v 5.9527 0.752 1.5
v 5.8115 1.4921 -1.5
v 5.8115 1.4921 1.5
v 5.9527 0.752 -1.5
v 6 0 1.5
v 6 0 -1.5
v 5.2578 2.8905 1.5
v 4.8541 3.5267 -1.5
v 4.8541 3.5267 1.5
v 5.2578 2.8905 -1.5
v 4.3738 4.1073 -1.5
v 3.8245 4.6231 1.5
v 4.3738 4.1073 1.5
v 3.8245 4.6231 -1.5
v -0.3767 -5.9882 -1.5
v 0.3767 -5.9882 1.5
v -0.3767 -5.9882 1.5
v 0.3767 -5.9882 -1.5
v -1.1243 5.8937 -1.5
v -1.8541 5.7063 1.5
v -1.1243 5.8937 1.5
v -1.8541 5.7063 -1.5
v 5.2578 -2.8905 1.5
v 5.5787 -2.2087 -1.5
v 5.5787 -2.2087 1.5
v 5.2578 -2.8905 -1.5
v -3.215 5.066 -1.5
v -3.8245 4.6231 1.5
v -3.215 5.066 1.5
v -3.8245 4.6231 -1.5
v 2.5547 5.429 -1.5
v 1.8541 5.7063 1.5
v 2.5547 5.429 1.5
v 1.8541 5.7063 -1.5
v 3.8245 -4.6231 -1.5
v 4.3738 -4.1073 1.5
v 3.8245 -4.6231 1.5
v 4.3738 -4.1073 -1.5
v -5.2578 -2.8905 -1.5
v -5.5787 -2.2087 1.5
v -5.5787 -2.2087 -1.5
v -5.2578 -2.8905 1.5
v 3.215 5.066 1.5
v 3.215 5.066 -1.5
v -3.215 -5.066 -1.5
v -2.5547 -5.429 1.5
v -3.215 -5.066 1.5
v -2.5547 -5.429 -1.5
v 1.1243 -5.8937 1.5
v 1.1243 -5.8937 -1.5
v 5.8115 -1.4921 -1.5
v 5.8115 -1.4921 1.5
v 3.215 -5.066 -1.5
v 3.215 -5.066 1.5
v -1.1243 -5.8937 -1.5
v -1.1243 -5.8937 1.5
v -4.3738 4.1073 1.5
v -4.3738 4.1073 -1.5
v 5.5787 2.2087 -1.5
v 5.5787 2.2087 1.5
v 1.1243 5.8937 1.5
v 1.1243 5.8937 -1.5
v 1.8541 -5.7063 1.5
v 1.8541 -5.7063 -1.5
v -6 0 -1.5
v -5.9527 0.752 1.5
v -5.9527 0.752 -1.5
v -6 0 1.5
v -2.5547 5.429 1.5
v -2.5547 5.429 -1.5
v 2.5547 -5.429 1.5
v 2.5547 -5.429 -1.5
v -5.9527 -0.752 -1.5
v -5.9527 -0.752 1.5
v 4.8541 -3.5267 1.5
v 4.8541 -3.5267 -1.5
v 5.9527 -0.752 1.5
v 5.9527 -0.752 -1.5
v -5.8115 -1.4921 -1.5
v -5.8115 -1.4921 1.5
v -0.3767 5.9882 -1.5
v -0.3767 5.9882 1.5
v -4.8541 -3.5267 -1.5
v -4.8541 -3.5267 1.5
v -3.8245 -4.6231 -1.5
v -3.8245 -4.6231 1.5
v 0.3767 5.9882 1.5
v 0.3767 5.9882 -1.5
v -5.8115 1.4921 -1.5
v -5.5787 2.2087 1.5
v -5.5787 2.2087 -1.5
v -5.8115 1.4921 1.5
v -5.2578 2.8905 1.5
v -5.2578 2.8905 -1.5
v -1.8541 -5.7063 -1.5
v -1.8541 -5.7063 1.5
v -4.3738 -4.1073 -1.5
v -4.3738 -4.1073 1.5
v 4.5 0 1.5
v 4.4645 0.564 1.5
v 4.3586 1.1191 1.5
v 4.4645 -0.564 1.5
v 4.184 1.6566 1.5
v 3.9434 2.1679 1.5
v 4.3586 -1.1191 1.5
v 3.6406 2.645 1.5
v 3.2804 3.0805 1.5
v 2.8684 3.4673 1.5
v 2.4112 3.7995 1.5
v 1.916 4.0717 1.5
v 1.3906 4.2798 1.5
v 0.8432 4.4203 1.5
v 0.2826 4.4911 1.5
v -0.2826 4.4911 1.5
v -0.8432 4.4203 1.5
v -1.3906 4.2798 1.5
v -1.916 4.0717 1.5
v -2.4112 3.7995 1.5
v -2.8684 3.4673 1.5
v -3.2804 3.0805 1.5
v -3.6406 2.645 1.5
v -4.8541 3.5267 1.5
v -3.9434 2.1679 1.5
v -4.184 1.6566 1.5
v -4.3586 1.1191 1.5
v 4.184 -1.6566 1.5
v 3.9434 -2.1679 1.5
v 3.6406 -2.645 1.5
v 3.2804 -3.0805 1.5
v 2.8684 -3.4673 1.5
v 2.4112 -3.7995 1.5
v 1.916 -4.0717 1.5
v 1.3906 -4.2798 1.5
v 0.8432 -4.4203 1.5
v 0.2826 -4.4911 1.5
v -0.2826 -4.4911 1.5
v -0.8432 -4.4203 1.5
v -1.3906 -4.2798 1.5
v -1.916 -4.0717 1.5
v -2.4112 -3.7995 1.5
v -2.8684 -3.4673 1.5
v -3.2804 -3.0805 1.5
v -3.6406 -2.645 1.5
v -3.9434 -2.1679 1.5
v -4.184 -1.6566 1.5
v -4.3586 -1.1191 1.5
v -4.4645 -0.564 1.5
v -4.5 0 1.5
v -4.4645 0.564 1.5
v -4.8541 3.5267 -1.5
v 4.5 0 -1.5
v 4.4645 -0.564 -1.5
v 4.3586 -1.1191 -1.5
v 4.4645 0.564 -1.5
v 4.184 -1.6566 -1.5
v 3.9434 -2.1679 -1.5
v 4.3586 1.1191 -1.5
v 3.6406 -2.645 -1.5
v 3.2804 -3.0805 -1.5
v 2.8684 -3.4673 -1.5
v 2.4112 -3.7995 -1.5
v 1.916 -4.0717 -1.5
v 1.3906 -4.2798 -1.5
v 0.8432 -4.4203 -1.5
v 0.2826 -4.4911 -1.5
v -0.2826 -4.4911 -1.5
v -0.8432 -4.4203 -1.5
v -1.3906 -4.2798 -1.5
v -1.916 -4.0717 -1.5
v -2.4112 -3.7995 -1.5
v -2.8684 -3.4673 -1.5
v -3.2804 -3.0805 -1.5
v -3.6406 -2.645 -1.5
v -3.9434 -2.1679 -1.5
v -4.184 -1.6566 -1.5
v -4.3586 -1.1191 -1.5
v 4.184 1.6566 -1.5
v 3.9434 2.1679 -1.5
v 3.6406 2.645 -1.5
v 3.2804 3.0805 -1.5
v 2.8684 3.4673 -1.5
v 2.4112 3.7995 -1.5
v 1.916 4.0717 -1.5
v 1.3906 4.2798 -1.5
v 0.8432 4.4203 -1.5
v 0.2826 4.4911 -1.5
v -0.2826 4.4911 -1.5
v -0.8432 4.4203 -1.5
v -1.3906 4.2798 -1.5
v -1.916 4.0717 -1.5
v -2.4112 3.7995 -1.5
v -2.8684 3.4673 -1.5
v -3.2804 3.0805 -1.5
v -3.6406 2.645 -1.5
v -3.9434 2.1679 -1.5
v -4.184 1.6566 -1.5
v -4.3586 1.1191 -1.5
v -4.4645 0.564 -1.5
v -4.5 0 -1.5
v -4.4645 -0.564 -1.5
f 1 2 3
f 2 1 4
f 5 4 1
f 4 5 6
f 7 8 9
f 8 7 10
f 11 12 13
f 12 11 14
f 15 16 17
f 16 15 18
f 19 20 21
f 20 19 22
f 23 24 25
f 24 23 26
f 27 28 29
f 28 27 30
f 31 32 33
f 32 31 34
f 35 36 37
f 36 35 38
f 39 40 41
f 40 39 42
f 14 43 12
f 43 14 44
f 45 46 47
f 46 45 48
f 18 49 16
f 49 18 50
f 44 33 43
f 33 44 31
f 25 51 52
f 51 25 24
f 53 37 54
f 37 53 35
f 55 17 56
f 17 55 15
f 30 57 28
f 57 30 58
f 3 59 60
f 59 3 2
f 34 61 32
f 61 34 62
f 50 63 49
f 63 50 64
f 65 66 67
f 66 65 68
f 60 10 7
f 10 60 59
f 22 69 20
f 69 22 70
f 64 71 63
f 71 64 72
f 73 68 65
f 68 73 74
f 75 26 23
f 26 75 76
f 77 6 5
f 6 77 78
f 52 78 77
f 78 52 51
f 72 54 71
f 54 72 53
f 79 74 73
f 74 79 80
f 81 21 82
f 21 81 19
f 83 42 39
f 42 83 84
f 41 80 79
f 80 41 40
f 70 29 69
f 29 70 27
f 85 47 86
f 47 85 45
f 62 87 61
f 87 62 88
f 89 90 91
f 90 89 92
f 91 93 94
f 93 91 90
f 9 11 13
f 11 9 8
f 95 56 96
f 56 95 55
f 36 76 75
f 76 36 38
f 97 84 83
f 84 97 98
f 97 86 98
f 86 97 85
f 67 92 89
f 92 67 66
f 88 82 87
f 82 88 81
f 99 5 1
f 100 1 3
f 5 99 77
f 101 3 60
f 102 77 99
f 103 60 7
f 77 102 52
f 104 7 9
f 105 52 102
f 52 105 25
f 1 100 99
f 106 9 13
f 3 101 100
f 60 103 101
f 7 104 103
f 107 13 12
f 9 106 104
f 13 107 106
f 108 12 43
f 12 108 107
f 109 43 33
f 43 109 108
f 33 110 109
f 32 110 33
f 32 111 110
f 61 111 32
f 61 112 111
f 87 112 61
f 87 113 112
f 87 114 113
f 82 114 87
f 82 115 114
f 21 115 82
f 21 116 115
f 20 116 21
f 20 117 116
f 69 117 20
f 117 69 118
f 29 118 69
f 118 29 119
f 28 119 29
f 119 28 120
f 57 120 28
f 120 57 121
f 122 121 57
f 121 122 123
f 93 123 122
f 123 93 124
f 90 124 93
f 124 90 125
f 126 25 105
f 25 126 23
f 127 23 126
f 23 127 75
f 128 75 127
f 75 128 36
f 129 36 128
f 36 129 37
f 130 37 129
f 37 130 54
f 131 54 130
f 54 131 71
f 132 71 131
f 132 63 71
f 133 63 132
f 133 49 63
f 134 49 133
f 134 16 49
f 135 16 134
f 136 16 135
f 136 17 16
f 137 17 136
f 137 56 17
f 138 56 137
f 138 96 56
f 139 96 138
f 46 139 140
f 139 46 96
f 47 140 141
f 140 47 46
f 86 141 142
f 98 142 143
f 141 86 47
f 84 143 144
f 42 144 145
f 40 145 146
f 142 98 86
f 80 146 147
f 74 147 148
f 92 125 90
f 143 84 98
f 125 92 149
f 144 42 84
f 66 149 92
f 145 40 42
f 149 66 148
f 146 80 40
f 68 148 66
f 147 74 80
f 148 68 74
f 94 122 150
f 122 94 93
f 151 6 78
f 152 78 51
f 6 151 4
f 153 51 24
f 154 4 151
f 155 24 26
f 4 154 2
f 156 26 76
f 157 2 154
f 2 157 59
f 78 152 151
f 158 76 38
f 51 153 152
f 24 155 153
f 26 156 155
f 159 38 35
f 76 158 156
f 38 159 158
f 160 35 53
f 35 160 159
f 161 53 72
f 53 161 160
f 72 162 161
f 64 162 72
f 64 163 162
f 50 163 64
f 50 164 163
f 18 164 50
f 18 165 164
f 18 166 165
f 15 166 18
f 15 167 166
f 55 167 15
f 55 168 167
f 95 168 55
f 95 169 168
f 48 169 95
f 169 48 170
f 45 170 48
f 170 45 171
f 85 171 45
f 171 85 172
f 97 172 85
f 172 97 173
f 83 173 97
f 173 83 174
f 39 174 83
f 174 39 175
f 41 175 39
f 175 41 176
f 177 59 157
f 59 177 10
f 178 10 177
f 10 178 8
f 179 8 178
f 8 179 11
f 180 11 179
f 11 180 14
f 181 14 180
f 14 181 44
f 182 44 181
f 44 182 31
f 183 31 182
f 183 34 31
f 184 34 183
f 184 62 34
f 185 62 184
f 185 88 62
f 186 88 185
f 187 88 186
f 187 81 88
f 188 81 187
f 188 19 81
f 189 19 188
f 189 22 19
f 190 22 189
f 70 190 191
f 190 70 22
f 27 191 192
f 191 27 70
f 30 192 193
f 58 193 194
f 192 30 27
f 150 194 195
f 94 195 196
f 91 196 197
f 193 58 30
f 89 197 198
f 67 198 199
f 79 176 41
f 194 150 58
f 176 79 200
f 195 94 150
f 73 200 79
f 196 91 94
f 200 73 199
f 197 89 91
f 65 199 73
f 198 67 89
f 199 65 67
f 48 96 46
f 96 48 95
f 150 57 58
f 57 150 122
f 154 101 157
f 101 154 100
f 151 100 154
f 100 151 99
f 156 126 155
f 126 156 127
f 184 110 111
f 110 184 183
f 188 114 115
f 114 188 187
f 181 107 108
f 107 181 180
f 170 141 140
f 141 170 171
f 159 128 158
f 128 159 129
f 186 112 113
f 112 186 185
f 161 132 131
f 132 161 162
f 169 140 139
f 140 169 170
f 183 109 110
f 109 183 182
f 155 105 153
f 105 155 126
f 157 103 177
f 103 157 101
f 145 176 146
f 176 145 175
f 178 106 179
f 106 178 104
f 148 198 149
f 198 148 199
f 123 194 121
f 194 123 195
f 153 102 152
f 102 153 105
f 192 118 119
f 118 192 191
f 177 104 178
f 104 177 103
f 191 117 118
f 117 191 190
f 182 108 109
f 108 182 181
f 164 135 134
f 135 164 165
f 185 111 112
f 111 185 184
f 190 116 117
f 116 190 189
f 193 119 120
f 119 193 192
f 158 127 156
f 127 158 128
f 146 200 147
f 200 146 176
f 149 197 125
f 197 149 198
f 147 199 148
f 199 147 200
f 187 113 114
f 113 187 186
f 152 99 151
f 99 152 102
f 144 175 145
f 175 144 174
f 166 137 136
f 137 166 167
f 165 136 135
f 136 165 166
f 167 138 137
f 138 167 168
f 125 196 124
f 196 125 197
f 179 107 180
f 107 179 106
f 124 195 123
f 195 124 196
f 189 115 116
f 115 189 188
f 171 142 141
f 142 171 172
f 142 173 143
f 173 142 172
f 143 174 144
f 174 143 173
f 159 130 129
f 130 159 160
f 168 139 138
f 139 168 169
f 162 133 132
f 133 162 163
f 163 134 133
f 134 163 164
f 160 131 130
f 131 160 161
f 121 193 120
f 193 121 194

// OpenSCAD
$fn = 50;


difference() {
	union() {
		translate(v = [0, 0, -1.5000000000]) {
			cylinder(h = 3, r = 6.0000000000);
		}
	}
	union() {
		translate(v = [0, 0, -100.0000000000]) {
			cylinder(h = 200, r = 4.5000000000);
		}
	}
}
